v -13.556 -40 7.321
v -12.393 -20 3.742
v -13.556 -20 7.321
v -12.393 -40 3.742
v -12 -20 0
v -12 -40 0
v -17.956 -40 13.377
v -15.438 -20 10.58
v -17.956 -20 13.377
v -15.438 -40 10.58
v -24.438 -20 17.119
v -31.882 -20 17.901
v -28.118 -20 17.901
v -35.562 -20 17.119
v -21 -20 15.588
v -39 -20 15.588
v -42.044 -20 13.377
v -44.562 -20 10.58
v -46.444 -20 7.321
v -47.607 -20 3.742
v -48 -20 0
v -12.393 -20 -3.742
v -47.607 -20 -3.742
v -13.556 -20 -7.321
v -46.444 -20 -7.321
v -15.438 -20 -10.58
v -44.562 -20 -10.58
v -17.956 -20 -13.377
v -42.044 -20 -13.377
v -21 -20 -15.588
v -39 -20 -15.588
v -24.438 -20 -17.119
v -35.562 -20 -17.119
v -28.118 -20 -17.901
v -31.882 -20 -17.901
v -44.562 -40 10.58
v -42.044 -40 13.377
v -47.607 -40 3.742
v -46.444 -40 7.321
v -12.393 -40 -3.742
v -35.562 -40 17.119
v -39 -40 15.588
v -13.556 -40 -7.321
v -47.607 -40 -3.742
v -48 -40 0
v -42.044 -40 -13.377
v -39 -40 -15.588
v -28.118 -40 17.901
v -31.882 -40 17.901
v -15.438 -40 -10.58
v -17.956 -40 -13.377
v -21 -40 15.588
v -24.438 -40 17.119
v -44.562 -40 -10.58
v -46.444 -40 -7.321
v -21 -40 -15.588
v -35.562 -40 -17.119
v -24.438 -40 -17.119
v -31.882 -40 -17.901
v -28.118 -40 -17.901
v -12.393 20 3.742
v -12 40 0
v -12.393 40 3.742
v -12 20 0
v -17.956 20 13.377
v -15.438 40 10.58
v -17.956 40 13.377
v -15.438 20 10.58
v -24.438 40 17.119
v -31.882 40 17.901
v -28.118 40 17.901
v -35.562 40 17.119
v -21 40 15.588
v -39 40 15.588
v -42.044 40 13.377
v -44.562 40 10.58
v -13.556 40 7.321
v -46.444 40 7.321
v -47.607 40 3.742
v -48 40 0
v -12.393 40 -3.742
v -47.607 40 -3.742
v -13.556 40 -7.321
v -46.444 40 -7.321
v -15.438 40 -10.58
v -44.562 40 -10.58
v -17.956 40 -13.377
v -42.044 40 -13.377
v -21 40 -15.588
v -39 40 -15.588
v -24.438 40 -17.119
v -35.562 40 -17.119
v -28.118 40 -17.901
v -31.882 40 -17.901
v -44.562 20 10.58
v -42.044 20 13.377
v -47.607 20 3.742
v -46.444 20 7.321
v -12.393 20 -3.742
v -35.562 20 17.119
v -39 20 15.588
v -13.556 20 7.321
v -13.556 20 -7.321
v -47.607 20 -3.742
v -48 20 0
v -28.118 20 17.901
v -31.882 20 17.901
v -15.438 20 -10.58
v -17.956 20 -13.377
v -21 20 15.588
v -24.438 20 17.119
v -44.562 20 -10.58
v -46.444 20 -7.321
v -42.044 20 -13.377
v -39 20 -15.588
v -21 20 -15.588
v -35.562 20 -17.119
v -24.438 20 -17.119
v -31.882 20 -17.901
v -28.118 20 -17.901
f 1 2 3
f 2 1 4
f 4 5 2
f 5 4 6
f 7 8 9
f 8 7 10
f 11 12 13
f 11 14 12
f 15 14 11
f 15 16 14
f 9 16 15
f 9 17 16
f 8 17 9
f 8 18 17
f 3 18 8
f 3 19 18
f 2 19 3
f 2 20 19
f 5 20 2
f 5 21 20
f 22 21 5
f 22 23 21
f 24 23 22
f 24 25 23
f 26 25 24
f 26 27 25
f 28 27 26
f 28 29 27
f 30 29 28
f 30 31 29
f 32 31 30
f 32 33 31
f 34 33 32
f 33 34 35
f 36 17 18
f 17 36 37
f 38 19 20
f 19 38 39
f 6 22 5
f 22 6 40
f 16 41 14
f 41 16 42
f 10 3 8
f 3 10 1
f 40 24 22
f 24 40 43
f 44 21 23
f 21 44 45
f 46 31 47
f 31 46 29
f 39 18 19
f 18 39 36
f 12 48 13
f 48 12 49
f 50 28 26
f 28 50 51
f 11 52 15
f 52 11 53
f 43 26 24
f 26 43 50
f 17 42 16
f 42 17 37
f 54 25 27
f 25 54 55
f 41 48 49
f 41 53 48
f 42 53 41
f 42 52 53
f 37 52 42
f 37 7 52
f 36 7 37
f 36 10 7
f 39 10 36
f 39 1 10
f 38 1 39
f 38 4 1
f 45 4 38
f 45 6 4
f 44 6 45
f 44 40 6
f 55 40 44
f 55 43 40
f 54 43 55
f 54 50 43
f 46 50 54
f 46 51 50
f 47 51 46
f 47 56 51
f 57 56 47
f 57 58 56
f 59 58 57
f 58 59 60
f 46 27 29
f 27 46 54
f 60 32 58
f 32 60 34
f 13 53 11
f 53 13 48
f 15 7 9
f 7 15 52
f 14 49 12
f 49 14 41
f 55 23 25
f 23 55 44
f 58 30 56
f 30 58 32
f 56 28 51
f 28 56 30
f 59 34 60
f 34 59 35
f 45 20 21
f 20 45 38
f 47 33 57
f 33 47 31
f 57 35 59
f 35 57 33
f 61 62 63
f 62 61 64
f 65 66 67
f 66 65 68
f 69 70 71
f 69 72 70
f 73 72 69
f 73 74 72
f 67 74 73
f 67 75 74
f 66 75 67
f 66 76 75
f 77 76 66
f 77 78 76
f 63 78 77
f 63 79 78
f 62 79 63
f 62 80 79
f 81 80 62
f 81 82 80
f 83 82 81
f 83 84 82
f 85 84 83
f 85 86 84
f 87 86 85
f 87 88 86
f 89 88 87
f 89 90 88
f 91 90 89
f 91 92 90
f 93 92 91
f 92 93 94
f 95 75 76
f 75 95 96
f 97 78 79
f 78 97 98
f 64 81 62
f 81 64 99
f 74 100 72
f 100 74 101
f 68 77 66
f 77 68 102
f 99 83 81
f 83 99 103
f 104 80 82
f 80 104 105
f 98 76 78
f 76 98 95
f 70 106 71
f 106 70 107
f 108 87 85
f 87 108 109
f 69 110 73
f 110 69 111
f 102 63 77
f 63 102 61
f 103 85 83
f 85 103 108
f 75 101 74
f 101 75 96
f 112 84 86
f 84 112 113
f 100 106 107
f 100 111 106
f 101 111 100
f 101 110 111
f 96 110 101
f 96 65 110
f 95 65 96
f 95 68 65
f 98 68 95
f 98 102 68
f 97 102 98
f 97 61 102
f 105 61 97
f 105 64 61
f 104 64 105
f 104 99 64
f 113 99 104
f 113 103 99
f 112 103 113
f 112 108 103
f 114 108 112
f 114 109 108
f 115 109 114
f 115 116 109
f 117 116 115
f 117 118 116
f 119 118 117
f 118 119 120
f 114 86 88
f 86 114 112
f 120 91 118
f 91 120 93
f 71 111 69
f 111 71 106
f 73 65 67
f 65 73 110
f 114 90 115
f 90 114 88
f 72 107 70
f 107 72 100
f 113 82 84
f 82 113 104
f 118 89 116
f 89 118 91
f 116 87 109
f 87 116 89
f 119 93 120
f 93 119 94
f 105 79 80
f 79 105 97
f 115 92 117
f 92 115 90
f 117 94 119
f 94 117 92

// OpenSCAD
// Tank dimensions
tank_length = 100;
tank_width = 60;
tank_height = 30;





module wheel( track_width,track_height ){
         translate( [0, track_width/2, 0 ] )
         rotate( [ 90, 0, 0 ] ){
         cylinder( h = track_width, r = track_height / 2 );
    } 
}

module fulltrack( w, h, l ){
    track_width = w;
    track_height = h;
    track_length = l;

    translate( [-track_length/3,0, 0 ] )
    wheel(track_width,track_height * 1.8);
}

module tracks(){
    track_width = 10;
    track_height = tank_height / 1.5;
    track_length = tank_length * 0.9;

    translate( [ 0, -tank_width / 2, 0 ] )
        fulltrack( 20, tank_height / 1.5, tank_length * 0.9);
    
    
    translate( [ 0, tank_width / 2, 0 ] )
        fulltrack( 20, tank_height / 1.5, tank_length * 0.9);
    
}


tracks();
